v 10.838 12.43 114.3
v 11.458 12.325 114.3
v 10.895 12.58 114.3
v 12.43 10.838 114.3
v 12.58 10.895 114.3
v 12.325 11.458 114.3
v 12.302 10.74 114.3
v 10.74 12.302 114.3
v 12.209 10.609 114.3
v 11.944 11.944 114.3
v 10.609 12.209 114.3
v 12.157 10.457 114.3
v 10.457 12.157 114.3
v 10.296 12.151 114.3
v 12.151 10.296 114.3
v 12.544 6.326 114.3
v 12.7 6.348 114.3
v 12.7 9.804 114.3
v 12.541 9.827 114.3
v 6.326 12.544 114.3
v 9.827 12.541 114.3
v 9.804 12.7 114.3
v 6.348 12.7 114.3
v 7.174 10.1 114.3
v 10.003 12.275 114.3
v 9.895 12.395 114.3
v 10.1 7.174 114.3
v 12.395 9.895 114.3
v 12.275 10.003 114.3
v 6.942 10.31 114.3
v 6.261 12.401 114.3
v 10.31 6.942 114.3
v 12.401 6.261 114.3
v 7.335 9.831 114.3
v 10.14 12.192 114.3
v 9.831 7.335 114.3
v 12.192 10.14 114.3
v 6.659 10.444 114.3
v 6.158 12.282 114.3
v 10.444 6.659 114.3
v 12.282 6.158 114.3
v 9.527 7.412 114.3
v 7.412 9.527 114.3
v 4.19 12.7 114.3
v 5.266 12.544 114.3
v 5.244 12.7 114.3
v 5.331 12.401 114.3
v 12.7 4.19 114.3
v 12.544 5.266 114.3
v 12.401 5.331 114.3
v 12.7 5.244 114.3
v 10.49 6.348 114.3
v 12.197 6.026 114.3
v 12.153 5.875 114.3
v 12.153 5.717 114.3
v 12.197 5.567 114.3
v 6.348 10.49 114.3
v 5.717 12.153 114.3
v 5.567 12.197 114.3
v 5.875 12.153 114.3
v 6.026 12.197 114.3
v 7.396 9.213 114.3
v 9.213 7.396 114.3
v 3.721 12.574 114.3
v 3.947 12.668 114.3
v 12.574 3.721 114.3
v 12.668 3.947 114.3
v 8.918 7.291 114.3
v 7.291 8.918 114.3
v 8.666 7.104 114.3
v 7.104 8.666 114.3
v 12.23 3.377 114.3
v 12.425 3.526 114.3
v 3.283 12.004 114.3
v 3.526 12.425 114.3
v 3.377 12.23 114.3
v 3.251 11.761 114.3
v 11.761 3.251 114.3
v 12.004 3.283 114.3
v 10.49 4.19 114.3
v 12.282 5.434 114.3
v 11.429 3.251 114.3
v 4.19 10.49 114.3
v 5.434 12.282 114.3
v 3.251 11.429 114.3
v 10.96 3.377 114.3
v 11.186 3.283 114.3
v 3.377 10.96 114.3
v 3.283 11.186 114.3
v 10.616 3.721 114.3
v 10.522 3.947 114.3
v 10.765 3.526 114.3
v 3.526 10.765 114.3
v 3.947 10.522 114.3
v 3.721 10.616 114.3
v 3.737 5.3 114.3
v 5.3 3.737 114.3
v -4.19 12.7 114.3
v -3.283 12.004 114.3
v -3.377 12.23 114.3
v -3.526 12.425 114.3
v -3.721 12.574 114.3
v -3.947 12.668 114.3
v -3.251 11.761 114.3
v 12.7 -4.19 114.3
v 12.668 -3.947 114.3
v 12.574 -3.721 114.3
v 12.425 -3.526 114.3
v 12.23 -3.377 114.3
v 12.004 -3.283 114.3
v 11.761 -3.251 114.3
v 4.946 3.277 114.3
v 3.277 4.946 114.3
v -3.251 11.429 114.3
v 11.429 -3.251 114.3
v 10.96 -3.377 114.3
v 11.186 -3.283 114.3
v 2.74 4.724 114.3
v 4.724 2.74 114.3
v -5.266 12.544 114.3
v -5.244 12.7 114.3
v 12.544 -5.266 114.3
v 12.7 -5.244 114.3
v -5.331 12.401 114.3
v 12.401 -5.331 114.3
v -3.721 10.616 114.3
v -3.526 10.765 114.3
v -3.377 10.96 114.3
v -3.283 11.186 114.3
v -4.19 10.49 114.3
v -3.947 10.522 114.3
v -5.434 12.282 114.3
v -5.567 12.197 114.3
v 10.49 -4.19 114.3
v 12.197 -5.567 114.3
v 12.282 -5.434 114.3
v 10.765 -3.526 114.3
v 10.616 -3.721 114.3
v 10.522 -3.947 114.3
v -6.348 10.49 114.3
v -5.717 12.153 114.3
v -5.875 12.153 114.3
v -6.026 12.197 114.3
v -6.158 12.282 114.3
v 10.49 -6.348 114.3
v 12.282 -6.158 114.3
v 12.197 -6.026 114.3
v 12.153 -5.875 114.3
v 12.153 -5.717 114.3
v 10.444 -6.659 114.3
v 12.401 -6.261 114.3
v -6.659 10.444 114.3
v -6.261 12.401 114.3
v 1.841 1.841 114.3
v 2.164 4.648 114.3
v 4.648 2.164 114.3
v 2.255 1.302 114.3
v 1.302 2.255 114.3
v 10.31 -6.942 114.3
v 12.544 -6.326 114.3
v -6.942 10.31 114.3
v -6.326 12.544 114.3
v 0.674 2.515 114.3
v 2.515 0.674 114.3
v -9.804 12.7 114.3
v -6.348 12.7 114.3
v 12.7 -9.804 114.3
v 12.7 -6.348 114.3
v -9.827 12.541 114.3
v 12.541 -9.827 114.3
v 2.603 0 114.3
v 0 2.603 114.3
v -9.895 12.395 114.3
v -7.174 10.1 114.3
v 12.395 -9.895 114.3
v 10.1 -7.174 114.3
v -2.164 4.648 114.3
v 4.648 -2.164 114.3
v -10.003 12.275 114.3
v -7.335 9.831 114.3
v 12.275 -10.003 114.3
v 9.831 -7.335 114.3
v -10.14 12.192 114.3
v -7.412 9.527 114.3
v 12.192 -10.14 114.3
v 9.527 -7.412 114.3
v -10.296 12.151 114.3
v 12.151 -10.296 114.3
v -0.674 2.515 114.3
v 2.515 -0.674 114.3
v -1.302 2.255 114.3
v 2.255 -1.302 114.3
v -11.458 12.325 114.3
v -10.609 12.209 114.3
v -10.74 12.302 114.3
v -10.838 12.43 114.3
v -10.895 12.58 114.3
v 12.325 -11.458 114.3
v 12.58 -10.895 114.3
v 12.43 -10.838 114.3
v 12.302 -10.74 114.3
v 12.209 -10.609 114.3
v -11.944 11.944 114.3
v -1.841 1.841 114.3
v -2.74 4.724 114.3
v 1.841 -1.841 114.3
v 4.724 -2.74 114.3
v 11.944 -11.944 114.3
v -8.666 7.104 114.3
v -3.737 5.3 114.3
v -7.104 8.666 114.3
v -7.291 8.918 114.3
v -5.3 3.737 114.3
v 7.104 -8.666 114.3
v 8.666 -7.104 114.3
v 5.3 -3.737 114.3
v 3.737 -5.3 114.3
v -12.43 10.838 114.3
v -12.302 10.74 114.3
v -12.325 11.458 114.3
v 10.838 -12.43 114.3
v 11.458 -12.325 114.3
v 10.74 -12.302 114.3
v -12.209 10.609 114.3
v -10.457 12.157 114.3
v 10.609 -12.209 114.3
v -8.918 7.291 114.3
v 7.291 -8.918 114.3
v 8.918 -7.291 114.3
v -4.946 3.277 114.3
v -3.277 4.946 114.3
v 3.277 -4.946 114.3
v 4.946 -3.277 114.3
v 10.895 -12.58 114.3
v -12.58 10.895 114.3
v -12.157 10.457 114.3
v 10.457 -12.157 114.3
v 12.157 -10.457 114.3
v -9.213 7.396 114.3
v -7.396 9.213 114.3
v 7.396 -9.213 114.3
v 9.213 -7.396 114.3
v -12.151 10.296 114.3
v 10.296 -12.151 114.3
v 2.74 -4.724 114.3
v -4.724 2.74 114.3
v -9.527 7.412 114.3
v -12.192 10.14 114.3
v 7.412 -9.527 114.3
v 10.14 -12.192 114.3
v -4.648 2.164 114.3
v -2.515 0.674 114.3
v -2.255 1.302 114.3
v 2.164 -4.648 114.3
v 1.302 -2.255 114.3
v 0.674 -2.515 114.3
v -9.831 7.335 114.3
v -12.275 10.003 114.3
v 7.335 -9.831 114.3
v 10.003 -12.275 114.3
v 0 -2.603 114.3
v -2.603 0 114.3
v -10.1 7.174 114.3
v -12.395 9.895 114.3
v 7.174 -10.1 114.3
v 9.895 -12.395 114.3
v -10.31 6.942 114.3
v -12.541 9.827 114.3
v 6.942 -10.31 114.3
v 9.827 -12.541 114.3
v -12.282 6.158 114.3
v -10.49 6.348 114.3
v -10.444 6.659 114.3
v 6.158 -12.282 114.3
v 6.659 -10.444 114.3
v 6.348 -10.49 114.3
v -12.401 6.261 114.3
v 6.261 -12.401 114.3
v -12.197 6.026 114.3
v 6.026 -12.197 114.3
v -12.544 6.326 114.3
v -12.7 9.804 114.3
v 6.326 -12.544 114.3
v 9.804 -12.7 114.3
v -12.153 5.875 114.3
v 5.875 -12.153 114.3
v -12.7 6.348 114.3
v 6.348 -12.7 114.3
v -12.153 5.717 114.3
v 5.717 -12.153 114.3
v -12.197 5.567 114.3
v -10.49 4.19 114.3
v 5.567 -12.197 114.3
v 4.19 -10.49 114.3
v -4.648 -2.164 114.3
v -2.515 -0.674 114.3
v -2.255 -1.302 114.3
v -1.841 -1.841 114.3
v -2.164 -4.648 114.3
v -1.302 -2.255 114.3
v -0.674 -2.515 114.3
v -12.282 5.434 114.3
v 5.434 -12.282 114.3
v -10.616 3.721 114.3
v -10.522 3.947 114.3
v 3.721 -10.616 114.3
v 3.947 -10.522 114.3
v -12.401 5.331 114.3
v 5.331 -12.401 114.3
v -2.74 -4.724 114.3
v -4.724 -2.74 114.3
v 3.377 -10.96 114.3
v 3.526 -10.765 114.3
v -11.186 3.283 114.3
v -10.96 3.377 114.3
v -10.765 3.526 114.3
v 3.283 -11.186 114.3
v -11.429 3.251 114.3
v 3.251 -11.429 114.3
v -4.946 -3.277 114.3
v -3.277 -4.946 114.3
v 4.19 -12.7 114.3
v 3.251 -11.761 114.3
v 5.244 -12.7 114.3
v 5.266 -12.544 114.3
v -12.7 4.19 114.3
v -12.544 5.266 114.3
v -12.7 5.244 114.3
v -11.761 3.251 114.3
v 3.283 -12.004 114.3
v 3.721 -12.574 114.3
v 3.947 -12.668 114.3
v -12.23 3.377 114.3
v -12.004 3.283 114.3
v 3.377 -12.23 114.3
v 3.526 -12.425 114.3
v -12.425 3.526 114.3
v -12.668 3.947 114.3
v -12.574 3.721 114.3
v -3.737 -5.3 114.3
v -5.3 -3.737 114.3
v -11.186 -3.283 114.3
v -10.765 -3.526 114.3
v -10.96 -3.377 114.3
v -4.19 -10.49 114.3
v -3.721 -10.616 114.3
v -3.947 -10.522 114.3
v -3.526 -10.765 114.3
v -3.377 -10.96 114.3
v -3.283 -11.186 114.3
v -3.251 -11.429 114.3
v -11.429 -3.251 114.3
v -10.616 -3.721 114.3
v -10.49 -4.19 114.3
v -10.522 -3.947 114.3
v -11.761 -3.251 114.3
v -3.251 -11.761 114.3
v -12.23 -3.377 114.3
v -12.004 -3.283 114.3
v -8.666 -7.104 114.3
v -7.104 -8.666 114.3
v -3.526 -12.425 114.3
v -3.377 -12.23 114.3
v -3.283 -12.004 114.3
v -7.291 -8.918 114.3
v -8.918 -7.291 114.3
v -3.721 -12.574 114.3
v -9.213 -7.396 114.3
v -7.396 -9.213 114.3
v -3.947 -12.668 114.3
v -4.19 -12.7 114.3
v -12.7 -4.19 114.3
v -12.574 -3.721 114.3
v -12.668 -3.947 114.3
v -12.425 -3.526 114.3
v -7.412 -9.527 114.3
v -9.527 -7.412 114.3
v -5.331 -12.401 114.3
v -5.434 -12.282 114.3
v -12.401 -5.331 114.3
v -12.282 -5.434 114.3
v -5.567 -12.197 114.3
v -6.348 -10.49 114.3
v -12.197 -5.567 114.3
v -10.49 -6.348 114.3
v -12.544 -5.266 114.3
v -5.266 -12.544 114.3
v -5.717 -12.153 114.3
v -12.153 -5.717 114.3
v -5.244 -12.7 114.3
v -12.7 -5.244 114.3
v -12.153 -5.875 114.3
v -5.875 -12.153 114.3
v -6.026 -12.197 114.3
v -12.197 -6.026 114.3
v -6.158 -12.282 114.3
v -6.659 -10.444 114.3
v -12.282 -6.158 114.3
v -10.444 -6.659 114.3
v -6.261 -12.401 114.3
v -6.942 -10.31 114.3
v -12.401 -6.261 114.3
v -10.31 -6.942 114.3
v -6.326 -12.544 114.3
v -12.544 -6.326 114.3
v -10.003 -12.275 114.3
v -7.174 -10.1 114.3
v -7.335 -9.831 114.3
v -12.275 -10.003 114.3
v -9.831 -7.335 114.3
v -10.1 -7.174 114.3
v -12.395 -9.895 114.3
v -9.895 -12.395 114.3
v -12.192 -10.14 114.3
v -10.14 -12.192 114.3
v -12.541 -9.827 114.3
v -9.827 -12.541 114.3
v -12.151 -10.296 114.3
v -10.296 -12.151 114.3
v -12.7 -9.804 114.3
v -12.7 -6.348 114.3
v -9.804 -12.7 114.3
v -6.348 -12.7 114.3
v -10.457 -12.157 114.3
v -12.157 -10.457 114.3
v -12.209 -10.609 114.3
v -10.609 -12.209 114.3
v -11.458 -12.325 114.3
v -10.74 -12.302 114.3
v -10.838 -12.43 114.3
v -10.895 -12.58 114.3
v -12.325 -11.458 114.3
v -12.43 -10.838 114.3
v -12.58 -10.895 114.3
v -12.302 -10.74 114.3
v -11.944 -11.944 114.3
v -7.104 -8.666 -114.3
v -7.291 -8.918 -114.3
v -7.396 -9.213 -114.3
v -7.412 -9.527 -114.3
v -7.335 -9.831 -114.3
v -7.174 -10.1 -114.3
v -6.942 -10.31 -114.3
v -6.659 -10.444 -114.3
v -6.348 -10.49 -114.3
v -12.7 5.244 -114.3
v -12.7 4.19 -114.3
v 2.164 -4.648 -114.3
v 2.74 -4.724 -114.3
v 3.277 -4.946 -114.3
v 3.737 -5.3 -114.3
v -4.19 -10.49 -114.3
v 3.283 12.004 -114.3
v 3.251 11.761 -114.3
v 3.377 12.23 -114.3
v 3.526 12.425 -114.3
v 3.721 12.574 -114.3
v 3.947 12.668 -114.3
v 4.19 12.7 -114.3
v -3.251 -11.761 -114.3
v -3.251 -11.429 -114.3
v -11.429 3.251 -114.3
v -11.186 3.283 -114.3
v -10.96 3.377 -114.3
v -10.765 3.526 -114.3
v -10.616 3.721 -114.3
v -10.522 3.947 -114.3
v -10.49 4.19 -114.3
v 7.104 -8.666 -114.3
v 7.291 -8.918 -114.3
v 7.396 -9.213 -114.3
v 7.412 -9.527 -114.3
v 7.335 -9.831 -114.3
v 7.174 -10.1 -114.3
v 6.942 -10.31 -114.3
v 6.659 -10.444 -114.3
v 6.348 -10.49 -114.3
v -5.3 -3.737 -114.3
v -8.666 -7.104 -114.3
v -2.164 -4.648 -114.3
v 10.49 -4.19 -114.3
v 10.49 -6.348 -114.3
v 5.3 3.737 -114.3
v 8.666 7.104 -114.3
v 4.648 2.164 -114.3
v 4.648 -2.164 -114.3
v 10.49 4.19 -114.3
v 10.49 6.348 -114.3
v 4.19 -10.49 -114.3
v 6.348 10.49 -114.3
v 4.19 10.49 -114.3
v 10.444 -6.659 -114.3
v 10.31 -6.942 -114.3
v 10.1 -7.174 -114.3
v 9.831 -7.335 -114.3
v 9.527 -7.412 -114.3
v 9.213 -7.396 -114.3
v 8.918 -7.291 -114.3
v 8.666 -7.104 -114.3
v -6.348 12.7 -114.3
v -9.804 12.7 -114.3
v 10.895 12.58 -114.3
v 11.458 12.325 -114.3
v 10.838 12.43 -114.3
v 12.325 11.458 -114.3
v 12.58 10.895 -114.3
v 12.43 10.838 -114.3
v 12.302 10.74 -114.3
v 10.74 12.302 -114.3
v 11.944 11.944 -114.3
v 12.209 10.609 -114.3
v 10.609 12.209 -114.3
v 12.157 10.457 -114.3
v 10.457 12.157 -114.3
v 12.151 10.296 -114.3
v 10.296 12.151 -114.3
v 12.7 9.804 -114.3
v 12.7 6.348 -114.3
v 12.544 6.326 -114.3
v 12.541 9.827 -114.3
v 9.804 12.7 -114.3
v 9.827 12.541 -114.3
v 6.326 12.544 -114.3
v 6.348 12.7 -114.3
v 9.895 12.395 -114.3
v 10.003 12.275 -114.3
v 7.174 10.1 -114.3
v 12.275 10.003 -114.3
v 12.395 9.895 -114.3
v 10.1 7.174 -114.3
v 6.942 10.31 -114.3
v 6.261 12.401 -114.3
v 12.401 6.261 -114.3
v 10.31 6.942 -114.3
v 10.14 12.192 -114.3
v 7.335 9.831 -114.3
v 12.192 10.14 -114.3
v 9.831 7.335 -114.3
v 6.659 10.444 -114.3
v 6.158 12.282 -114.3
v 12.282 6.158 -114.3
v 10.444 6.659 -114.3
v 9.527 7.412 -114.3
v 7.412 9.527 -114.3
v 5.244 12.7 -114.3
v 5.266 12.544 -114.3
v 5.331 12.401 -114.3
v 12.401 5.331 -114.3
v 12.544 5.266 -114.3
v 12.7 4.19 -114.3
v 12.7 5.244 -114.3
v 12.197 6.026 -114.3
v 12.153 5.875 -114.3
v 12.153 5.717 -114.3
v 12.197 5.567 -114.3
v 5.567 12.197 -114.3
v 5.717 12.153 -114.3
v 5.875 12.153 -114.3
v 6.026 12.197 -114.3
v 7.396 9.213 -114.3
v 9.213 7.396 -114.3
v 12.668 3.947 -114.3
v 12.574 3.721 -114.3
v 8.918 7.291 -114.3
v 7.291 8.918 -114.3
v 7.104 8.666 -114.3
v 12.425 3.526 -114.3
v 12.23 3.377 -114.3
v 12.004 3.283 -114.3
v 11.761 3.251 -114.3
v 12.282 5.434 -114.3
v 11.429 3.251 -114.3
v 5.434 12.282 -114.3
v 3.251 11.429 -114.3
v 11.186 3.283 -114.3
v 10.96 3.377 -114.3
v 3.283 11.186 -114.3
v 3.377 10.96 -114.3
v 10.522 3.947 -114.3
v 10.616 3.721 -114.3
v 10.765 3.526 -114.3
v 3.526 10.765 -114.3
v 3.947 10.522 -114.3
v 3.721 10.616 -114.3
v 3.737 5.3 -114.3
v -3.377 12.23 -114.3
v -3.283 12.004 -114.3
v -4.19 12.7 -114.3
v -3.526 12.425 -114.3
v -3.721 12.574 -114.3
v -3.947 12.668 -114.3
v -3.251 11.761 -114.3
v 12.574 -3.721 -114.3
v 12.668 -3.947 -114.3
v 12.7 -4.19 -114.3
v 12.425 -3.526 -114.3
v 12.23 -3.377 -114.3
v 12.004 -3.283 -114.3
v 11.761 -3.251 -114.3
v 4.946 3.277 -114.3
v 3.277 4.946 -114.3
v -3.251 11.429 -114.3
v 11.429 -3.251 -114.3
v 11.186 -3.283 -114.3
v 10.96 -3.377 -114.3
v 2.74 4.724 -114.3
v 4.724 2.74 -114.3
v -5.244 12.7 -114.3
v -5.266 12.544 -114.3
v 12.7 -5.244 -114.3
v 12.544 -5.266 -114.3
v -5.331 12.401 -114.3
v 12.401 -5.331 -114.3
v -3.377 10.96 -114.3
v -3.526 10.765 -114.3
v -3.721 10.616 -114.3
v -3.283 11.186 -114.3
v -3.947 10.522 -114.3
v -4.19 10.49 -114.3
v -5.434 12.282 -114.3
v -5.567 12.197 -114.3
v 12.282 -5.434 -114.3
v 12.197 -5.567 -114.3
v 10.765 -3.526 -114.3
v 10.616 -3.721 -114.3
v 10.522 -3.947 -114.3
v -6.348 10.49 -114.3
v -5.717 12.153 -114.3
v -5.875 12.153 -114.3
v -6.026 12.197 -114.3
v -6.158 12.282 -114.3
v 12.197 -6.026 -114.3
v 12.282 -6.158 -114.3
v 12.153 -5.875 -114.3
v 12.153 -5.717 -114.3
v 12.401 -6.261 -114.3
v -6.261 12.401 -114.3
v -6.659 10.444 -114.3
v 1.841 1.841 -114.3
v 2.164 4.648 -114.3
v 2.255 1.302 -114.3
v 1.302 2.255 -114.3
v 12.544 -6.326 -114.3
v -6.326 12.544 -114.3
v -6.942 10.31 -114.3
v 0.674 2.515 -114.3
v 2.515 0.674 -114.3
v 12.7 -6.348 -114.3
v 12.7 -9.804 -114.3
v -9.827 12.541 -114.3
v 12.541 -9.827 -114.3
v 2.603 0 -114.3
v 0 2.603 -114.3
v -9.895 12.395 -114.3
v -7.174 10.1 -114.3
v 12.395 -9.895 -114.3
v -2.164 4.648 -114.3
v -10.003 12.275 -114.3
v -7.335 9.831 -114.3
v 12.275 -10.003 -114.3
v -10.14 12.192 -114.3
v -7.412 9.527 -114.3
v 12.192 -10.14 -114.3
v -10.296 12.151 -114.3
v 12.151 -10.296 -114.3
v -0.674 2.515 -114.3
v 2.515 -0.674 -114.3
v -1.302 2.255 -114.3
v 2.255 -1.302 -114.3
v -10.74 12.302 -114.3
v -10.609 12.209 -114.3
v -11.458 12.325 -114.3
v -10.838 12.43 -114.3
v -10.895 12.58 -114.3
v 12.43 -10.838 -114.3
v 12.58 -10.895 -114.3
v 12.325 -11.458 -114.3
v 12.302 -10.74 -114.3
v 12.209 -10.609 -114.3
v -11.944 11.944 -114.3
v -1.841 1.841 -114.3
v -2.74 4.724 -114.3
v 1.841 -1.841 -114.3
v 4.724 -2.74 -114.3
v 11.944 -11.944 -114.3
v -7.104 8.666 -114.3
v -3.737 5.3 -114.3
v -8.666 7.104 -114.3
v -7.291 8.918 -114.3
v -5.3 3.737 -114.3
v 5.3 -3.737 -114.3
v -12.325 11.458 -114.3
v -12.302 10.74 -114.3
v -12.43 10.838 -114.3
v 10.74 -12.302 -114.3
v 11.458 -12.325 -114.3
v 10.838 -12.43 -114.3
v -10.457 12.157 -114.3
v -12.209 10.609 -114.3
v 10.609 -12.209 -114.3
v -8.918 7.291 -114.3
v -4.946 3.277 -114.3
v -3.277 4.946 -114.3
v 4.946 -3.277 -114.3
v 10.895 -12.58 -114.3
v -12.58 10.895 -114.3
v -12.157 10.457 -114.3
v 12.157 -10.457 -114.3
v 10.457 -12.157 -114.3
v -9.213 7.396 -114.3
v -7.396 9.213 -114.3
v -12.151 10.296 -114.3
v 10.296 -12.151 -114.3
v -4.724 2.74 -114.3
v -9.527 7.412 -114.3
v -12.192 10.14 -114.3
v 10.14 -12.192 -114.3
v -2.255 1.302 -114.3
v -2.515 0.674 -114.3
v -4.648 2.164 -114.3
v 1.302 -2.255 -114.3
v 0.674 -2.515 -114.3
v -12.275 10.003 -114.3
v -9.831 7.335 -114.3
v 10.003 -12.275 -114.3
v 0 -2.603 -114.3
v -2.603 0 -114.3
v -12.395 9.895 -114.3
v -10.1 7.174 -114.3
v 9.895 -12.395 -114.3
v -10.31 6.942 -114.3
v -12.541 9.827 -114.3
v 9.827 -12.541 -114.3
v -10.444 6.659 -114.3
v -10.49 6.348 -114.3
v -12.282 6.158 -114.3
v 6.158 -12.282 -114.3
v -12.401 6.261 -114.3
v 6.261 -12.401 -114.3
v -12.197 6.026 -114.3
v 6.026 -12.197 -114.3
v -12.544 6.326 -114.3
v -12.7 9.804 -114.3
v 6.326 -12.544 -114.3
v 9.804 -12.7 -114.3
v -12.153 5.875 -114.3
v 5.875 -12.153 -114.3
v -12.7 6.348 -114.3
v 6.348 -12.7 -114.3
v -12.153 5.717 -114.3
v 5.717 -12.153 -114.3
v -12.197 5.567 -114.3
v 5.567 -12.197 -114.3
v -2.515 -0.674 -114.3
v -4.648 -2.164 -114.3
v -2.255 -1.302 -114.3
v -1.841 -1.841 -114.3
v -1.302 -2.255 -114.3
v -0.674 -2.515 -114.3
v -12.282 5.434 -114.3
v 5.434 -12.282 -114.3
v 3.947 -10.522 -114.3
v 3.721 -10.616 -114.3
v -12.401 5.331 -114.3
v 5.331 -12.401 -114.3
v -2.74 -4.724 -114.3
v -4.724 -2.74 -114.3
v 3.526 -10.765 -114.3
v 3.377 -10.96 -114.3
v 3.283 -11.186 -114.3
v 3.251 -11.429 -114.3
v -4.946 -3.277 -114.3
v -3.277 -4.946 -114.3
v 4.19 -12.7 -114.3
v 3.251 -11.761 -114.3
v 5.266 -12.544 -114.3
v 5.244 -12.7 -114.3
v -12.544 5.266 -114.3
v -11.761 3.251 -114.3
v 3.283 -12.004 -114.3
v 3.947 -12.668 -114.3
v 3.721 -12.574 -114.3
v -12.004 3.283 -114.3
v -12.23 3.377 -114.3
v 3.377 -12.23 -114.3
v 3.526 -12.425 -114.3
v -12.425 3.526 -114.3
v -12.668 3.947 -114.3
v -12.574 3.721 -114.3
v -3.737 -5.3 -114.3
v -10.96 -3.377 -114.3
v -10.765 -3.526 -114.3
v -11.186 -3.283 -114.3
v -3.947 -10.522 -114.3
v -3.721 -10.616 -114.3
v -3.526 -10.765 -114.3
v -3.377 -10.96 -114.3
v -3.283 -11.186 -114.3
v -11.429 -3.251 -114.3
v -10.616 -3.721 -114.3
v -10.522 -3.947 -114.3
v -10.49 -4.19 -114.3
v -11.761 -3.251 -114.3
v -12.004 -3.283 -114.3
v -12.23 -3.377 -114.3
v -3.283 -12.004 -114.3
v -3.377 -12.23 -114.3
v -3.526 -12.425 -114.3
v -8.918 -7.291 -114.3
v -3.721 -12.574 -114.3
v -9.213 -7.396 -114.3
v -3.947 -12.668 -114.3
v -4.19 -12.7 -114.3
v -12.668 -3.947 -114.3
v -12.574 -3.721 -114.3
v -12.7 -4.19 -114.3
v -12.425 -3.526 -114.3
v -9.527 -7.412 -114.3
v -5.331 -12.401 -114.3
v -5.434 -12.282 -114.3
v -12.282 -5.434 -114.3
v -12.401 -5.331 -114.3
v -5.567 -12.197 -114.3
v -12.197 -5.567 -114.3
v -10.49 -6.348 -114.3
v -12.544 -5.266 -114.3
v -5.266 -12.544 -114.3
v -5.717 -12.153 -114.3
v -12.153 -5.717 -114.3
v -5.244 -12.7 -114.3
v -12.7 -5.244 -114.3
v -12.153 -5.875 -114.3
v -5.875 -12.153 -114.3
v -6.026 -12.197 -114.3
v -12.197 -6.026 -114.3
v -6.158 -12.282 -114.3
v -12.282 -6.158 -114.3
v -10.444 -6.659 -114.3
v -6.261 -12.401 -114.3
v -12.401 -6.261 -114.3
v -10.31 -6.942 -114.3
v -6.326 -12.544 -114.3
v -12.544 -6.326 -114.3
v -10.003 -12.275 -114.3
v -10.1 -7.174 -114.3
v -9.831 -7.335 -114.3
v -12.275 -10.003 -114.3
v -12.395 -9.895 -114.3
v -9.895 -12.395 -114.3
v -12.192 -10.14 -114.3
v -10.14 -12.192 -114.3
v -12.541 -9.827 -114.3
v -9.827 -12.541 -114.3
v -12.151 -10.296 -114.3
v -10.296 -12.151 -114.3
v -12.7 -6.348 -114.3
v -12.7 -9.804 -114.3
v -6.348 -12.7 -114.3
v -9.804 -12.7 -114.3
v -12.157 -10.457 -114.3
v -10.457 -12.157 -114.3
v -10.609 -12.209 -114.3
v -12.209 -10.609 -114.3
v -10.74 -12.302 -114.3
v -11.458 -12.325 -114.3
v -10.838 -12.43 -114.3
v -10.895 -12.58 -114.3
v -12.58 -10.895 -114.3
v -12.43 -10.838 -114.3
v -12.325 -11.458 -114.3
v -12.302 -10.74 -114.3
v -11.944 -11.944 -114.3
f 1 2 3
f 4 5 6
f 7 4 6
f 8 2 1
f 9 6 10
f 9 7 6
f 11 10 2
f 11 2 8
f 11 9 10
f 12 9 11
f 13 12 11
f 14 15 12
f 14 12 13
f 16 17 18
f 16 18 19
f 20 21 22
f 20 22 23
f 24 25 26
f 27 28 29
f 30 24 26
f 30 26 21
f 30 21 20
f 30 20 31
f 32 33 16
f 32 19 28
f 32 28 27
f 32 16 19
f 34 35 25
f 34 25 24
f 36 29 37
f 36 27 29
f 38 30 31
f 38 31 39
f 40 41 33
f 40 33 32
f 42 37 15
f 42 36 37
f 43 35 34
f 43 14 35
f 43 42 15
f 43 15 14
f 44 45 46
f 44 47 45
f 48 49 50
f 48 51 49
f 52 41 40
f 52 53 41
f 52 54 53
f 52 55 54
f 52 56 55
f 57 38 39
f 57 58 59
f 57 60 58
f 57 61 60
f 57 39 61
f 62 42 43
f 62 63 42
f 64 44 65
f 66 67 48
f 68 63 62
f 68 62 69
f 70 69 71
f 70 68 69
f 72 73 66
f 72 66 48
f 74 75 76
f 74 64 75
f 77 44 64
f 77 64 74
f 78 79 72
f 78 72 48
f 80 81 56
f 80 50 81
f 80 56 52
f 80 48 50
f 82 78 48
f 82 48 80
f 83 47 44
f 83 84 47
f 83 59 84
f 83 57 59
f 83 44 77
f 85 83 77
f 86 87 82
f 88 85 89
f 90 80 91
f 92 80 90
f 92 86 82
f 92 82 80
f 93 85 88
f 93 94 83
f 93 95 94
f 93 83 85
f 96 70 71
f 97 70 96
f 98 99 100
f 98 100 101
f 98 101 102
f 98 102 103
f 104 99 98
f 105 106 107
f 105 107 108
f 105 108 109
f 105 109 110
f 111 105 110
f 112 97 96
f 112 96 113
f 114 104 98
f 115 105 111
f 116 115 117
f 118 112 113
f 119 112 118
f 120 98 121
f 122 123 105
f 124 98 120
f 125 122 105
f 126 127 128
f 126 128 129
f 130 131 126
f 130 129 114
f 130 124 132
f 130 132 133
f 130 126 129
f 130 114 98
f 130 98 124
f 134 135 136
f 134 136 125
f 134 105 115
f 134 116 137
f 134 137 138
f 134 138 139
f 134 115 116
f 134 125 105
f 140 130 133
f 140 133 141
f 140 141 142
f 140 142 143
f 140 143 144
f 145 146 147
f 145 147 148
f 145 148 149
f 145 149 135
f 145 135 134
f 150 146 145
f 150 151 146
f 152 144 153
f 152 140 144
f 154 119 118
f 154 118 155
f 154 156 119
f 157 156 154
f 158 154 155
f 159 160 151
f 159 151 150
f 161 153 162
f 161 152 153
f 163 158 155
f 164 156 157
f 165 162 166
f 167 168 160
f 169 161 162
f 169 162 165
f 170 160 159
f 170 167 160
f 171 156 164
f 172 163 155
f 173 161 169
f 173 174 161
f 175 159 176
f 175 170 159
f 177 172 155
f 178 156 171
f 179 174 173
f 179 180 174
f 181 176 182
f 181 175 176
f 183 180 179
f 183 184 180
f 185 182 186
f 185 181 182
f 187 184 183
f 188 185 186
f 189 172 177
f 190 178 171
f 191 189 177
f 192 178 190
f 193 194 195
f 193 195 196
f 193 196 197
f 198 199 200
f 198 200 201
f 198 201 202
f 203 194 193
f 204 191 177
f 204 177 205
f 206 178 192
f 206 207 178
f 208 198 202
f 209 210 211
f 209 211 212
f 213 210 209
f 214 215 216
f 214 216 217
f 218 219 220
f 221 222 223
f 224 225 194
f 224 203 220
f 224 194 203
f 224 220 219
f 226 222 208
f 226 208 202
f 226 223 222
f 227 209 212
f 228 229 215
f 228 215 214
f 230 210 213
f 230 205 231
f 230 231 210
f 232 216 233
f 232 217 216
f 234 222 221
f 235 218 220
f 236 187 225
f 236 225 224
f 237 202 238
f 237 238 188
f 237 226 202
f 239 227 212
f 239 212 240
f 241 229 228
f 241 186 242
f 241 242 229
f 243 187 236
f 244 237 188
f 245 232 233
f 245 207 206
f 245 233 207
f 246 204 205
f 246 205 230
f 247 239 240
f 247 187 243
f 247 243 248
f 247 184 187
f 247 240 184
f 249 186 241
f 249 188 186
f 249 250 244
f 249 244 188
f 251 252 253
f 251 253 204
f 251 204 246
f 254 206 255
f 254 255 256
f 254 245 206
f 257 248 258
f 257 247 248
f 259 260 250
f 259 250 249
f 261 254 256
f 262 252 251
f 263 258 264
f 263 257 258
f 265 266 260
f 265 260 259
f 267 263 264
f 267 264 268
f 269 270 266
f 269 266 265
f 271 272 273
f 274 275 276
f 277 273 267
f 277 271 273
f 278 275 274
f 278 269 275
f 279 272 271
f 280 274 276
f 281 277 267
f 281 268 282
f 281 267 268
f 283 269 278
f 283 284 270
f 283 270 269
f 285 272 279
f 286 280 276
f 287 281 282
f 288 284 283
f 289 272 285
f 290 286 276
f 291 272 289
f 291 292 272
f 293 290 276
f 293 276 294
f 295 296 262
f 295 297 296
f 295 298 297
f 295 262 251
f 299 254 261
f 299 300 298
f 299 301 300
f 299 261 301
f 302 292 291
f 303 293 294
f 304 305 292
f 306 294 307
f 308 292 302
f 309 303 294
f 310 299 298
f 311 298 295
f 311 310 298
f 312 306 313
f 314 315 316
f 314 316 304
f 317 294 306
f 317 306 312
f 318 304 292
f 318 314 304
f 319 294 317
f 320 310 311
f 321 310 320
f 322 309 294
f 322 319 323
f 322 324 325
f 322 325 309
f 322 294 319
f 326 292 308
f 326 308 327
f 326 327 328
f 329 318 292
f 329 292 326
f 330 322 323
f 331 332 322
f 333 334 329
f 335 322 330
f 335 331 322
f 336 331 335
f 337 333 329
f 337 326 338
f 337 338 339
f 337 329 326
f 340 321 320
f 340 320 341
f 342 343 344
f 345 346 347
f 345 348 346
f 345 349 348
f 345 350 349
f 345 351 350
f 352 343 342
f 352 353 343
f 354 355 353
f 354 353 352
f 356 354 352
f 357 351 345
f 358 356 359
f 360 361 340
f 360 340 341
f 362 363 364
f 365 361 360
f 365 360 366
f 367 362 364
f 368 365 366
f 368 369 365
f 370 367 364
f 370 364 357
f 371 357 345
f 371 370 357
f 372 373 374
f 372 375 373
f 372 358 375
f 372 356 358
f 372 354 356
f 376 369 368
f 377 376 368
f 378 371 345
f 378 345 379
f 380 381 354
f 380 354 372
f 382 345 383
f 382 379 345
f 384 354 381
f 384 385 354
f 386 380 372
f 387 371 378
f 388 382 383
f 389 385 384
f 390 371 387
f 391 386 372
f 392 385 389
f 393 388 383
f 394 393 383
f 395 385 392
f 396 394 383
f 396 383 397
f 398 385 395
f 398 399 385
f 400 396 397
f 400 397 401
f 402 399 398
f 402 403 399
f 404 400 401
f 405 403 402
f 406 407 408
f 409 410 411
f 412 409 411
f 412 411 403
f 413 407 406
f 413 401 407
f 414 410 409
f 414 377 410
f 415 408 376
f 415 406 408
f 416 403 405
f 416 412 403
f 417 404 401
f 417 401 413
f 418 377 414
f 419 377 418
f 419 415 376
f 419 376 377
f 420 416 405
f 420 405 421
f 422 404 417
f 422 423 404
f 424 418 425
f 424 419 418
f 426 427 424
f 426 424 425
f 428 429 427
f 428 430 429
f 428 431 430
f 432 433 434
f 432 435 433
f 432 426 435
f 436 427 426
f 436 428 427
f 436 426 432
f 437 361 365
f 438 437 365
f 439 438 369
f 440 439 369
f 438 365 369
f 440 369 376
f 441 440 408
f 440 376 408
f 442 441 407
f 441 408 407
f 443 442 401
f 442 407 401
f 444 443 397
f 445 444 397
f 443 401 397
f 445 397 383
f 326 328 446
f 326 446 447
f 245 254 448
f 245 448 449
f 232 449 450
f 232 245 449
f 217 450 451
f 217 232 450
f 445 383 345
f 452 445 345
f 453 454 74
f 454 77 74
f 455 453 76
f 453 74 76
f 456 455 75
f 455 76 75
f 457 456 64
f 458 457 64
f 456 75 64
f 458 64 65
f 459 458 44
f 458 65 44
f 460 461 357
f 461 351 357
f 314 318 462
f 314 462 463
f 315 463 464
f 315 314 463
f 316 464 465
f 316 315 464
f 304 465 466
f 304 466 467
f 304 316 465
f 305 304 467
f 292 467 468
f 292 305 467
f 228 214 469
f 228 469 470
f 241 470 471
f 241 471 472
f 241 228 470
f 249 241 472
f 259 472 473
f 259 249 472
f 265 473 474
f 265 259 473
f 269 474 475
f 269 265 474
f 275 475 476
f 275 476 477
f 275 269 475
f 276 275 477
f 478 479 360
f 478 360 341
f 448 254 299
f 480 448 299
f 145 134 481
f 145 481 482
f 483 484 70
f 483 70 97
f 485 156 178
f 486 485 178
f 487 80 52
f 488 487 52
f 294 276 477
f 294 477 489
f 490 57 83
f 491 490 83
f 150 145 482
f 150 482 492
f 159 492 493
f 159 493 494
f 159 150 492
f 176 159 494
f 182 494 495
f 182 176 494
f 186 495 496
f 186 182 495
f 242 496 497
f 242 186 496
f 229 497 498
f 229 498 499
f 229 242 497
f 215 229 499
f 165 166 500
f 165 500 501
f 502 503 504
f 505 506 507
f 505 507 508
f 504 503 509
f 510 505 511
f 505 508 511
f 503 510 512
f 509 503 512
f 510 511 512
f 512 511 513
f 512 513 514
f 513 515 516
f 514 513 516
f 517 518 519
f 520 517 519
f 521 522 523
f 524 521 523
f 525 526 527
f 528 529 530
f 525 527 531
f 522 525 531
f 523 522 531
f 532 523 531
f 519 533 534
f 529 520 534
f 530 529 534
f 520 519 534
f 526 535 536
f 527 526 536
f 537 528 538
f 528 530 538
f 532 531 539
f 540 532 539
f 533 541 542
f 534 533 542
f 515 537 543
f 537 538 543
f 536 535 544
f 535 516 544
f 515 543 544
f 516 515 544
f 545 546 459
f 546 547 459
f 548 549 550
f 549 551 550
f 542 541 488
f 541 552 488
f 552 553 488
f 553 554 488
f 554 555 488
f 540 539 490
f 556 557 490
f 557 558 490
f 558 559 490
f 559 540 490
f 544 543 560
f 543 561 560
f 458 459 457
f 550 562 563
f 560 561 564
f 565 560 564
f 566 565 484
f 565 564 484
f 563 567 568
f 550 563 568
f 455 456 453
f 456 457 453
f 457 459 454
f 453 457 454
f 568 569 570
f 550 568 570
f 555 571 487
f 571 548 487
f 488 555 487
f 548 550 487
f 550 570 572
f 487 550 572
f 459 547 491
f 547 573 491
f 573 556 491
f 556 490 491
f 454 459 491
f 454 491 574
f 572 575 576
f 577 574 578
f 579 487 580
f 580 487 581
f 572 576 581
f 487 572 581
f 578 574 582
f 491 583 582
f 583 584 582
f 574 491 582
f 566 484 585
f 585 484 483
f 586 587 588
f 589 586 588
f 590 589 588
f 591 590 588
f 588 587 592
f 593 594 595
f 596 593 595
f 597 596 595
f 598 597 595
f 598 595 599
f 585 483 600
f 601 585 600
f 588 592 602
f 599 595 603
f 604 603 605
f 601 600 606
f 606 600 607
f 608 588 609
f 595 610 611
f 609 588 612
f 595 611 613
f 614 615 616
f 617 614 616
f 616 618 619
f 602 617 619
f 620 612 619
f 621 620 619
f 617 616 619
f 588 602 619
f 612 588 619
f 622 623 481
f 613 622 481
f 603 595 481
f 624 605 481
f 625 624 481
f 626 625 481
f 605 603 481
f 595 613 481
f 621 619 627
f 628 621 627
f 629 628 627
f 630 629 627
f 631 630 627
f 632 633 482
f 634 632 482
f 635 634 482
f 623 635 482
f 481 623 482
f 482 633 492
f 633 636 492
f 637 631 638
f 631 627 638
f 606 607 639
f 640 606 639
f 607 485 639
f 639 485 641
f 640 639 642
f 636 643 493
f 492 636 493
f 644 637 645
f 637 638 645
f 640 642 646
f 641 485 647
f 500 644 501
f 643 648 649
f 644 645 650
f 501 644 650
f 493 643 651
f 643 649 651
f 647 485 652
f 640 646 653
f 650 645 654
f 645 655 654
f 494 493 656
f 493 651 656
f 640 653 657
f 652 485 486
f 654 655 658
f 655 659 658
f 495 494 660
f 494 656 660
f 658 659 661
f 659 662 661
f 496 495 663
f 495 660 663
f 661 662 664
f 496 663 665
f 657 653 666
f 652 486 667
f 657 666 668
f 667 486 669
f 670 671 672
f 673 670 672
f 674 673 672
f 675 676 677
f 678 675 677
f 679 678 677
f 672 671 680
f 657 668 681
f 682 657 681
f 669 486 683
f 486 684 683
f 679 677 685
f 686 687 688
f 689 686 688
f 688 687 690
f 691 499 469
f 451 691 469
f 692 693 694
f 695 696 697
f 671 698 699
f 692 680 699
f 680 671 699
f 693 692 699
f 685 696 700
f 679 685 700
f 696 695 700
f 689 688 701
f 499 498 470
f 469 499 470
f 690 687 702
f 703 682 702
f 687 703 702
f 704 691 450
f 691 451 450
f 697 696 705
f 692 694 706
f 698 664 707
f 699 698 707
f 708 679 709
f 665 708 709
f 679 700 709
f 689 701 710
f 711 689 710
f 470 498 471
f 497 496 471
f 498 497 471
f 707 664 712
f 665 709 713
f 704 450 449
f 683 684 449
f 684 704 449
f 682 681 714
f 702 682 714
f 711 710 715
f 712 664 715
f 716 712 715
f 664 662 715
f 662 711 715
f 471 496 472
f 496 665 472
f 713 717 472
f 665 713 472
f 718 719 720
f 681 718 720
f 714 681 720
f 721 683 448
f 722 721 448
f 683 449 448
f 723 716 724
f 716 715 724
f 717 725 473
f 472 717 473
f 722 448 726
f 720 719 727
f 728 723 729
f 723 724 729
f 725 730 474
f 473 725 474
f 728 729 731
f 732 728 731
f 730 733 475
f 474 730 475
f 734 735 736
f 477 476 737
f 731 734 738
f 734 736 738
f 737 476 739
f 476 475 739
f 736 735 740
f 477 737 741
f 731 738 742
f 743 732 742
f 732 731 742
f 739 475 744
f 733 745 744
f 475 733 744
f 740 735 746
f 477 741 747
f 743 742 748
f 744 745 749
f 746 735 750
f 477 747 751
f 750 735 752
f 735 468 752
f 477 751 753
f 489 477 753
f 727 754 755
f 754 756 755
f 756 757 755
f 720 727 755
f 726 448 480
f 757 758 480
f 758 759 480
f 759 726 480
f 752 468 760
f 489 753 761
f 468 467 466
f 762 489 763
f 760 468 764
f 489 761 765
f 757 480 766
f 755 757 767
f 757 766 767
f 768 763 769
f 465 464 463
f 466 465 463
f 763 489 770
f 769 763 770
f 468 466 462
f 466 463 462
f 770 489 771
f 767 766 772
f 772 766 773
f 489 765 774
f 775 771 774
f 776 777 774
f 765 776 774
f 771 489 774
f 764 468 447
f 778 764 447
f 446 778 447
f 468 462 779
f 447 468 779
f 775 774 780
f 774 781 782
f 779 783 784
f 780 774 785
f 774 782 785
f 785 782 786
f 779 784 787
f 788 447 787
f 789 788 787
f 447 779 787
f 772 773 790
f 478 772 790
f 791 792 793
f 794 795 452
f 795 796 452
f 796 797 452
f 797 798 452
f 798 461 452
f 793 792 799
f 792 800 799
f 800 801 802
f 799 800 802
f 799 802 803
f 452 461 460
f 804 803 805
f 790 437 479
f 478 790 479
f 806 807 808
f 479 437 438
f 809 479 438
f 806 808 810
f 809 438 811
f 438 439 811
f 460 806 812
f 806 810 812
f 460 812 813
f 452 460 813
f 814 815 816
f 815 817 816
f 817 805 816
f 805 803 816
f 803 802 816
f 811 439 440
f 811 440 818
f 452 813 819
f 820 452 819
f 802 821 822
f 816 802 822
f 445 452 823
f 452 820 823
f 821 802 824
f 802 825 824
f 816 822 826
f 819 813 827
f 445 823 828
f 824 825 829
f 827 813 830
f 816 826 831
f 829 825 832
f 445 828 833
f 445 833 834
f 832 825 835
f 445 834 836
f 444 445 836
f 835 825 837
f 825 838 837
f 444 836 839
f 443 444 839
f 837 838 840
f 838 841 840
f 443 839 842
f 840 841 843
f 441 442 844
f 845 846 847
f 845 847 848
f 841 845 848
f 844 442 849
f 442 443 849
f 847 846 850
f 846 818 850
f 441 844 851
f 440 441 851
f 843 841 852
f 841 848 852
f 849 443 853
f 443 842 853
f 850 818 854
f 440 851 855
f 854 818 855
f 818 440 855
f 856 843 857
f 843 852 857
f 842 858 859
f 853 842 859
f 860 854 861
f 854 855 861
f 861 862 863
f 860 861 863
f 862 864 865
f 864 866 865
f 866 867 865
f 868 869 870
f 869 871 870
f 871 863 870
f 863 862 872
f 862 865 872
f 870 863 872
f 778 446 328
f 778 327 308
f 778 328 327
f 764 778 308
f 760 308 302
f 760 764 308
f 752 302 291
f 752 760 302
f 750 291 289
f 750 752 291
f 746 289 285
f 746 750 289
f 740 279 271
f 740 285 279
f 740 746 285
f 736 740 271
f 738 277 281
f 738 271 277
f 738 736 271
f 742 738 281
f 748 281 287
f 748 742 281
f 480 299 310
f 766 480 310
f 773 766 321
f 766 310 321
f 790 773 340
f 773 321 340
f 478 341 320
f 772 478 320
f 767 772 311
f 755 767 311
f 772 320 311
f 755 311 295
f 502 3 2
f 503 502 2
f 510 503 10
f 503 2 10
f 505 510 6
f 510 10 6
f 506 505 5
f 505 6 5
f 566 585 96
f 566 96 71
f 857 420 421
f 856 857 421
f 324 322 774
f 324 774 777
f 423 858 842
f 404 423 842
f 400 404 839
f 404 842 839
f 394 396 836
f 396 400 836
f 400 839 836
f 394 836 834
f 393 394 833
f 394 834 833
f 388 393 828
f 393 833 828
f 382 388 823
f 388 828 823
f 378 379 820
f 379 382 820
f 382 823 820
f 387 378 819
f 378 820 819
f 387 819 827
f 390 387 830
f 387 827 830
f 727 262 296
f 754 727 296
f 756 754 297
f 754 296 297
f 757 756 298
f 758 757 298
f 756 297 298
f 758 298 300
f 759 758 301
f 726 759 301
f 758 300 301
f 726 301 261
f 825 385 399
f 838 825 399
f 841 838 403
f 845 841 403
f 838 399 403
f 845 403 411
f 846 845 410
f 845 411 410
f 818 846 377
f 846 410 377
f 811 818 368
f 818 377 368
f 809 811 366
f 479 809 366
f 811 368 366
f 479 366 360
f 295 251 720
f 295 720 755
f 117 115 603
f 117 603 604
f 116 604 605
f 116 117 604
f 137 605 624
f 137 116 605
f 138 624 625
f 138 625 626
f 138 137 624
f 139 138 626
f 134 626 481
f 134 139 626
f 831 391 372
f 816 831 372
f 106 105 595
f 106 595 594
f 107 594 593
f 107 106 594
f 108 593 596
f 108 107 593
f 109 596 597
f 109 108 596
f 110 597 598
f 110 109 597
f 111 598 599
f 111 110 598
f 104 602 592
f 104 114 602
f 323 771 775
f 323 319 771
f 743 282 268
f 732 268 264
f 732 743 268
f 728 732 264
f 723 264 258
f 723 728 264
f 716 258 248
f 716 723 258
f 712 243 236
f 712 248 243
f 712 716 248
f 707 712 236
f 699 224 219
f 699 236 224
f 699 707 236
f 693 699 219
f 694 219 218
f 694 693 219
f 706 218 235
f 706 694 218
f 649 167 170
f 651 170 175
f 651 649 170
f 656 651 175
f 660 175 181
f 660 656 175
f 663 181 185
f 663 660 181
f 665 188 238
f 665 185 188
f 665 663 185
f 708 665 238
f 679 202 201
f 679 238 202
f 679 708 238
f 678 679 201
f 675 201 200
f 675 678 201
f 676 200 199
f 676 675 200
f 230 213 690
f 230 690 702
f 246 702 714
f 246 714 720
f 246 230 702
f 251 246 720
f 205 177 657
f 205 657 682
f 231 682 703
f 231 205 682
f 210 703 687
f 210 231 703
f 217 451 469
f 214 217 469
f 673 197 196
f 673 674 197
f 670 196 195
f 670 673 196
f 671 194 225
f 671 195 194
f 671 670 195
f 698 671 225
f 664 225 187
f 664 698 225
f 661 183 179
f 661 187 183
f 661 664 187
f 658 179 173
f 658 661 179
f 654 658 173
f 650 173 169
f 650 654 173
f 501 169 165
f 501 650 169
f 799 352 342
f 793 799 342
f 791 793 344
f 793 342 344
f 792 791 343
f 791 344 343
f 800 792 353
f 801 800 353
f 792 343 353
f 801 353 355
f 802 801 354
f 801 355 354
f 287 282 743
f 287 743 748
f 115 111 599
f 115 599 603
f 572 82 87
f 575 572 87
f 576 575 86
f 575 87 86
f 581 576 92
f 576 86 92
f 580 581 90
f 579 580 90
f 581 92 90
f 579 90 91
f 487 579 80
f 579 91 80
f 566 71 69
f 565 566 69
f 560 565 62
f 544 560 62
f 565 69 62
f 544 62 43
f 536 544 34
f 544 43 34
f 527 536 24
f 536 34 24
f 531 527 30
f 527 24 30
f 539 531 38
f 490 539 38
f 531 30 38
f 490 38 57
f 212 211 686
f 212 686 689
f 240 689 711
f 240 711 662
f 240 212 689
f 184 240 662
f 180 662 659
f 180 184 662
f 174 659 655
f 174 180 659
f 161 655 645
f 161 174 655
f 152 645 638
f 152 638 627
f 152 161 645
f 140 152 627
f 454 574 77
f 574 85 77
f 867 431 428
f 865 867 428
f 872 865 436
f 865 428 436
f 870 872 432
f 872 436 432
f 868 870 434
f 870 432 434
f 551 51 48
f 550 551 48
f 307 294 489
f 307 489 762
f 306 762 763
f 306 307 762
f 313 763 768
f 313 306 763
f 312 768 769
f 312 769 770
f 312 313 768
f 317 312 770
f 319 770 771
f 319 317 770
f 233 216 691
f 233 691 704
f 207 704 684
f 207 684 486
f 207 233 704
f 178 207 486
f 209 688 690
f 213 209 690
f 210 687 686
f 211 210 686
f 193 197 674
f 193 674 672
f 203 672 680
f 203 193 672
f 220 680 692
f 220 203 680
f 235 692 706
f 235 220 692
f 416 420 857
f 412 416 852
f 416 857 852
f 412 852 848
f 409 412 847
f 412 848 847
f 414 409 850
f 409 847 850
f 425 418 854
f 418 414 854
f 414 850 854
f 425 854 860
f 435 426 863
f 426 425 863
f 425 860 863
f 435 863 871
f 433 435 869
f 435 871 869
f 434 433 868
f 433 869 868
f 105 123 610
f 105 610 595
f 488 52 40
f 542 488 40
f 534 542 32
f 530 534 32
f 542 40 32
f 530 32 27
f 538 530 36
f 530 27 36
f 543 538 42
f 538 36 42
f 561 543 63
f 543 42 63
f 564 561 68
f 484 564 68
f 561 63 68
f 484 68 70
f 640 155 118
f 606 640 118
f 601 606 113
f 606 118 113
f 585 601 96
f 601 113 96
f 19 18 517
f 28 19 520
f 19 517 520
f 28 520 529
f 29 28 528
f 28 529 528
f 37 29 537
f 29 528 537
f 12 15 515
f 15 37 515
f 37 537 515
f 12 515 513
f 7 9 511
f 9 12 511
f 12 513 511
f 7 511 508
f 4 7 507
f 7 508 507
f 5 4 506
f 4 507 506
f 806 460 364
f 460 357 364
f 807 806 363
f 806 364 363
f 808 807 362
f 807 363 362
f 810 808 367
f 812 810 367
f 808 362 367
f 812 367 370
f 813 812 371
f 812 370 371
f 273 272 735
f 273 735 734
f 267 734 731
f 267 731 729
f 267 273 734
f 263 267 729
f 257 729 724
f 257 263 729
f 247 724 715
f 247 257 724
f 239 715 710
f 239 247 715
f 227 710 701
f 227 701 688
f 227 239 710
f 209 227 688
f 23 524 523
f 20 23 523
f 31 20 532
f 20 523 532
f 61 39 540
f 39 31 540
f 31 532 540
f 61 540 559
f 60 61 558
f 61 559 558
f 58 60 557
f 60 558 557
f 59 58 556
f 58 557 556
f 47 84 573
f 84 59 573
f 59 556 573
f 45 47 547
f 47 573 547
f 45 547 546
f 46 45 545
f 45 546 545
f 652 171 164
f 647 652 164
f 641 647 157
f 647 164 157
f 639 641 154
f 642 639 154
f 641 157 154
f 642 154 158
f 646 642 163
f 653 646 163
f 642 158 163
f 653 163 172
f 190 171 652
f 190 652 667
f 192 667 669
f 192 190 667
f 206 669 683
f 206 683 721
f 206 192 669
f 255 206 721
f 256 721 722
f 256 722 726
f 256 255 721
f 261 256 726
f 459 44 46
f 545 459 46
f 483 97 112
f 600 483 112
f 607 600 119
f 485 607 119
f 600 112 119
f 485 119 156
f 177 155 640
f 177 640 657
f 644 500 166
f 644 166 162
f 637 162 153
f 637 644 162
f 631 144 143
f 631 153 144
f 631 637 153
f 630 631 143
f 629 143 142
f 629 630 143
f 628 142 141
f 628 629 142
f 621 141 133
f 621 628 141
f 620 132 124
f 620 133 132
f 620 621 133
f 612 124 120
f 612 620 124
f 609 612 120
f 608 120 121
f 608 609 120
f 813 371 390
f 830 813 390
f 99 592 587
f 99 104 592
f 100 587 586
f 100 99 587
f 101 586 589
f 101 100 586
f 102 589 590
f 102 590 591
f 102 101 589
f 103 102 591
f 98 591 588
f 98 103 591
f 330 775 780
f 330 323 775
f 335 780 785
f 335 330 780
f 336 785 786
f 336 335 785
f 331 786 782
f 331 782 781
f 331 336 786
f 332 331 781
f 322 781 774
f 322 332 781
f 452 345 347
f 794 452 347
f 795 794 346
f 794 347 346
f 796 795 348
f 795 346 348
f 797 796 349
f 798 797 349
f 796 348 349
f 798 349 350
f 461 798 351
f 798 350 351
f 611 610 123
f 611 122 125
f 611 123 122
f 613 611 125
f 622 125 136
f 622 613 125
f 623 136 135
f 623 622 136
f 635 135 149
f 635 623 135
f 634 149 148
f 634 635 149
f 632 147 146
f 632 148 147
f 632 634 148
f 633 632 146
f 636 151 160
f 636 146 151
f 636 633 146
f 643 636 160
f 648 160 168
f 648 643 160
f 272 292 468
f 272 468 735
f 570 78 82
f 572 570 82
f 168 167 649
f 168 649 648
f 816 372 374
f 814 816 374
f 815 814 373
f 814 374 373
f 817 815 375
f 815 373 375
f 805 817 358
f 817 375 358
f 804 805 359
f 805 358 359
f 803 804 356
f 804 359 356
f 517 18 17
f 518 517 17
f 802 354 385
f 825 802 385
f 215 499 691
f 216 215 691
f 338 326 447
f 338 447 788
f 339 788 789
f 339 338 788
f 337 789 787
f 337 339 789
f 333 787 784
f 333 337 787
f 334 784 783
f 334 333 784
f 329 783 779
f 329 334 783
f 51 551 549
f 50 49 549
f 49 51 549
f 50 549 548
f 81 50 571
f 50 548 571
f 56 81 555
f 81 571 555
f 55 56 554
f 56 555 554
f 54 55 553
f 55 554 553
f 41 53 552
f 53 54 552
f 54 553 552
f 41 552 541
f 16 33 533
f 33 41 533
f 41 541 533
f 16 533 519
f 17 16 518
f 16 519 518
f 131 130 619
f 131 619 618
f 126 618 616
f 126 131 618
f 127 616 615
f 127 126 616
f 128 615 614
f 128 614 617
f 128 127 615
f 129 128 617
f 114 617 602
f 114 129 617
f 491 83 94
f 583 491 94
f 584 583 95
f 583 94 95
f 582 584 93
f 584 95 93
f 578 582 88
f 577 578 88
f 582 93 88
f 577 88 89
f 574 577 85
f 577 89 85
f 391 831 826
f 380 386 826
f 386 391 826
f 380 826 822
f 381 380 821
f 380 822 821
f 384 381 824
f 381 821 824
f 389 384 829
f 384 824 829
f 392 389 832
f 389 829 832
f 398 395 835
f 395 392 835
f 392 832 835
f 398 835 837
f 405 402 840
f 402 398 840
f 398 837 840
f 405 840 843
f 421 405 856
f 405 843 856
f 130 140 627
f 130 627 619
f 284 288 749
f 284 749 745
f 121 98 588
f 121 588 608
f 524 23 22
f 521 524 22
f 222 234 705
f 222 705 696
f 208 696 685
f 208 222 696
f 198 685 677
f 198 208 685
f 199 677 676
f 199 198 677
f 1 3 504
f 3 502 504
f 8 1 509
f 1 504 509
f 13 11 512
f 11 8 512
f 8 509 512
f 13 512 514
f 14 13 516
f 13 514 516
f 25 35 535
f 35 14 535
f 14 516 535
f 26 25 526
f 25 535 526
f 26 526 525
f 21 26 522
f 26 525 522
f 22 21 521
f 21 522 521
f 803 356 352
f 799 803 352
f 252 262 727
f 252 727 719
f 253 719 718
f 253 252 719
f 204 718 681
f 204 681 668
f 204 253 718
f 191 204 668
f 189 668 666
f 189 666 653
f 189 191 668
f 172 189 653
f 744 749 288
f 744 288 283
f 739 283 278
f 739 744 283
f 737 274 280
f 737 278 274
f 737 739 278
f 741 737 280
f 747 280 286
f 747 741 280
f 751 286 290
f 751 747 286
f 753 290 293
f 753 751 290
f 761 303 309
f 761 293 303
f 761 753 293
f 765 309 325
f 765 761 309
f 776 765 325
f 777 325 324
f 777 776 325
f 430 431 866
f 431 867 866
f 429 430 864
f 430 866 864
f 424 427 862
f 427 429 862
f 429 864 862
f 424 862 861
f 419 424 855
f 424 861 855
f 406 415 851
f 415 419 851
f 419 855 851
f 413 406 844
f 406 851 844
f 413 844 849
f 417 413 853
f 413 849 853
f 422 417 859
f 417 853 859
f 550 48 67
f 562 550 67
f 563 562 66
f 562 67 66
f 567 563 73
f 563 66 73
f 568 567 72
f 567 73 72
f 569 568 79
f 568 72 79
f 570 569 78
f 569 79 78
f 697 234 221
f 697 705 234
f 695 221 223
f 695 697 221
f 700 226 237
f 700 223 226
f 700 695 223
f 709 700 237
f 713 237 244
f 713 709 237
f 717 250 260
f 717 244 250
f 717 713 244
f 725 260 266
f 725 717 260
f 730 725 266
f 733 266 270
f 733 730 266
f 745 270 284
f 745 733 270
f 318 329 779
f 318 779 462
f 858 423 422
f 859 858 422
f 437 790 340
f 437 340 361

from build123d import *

# Parameters (mm, degrees)
BOSS_EXTRUDE1_DEPTH     = 114.3
CUT_EXTRUDE1_DEPTH      = 116.702506455
CUT_EXTRUDE1_DEPTH_BACK = 116.702506455
SKETCH5_R               = 0.55245


with BuildPart() as part:
    # Sketch4 → Boss-Extrude1 (new, symmetric)
    with BuildSketch(Plane.XY):
        with BuildLine():
            Line((4.190365, -12.7), (10.11729625, -12.7))
            ThreePointArc((10.11729625, -12.7), (11.943543585, -11.943543585), (12.7, -10.11729625))
            Line((12.7, -10.11729625), (12.7, -4.190365))
            ThreePointArc((12.7, -4.190365), (12.42492494, -3.52627506), (11.760835, -3.2512))
            Line((11.760835, -3.2512), (11.429365, -3.2512))
            ThreePointArc((11.429365, -3.2512), (10.76527506, -3.52627506), (10.4902, -4.190365))
            Line((10.4902, -4.190365), (10.4902, -6.348478019))
            ThreePointArc((10.4902, -6.348478019), (9.830707141, -7.335478831), (8.666460301, -7.103895736))
            Line((8.666460301, -7.103895736), (5.299899128, -3.737334563))
            ThreePointArc((5.299899128, -3.737334563), (4.817571085, -3.015479634), (4.6482, -2.16399369))
            Line((4.6482, -2.16399369), (4.6482, 0))
            Line((4.6482, 0), (2.6035, 0))
            ThreePointArc((2.6035, 0), (1.840952505, -1.840952505), (0, -2.6035))
            Line((0, -2.6035), (0, -4.6482))
            Line((0, -4.6482), (2.16399369, -4.6482))
            ThreePointArc((2.16399369, -4.6482), (3.015479634, -4.817571085), (3.737334563, -5.299899128))
            Line((3.737334563, -5.299899128), (7.103895736, -8.666460301))
            ThreePointArc((7.103895736, -8.666460301), (7.335478831, -9.830707141), (6.348478019, -10.4902))
            Line((6.348478019, -10.4902), (4.190365, -10.4902))
            ThreePointArc((4.190365, -10.4902), (3.52627506, -10.76527506), (3.2512, -11.429365))
            Line((3.2512, -11.429365), (3.2512, -11.760835))
            ThreePointArc((3.2512, -11.760835), (3.52627506, -12.42492494), (4.190365, -12.7))
        make_face()
    extrude(amount=BOSS_EXTRUDE1_DEPTH, both=True)

    # Sketch5 → Cut-Extrude1 (cut, two sides: drawn at the far end of the back side and taken through both)
    with BuildSketch(Plane.XY.offset(-CUT_EXTRUDE1_DEPTH_BACK)):
        with Locations((10.356153152, -12.7)):
            Circle(SKETCH5_R)
        with Locations((5.796028019, -12.7)):
            Circle(SKETCH5_R)
        with Locations((12.7, -10.356153152)):
            Circle(SKETCH5_R)
        with Locations((12.7, -5.796028019)):
            Circle(SKETCH5_R)
    extrude(amount=CUT_EXTRUDE1_DEPTH + CUT_EXTRUDE1_DEPTH_BACK, mode=Mode.SUBTRACT)

    # Mirror1: part across plane


with BuildPart() as part_1:
    add(part.part)
    add(part.part.mirror(Plane(origin=(0, 0, 0), x_dir=(0, 0, 1), z_dir=(1, 0, 0))))

    # Mirror2: part across plane


with BuildPart() as part_2:
    add(part_1.part)
    add(part_1.part.mirror(Plane.ZX))


solid = part_2.part
